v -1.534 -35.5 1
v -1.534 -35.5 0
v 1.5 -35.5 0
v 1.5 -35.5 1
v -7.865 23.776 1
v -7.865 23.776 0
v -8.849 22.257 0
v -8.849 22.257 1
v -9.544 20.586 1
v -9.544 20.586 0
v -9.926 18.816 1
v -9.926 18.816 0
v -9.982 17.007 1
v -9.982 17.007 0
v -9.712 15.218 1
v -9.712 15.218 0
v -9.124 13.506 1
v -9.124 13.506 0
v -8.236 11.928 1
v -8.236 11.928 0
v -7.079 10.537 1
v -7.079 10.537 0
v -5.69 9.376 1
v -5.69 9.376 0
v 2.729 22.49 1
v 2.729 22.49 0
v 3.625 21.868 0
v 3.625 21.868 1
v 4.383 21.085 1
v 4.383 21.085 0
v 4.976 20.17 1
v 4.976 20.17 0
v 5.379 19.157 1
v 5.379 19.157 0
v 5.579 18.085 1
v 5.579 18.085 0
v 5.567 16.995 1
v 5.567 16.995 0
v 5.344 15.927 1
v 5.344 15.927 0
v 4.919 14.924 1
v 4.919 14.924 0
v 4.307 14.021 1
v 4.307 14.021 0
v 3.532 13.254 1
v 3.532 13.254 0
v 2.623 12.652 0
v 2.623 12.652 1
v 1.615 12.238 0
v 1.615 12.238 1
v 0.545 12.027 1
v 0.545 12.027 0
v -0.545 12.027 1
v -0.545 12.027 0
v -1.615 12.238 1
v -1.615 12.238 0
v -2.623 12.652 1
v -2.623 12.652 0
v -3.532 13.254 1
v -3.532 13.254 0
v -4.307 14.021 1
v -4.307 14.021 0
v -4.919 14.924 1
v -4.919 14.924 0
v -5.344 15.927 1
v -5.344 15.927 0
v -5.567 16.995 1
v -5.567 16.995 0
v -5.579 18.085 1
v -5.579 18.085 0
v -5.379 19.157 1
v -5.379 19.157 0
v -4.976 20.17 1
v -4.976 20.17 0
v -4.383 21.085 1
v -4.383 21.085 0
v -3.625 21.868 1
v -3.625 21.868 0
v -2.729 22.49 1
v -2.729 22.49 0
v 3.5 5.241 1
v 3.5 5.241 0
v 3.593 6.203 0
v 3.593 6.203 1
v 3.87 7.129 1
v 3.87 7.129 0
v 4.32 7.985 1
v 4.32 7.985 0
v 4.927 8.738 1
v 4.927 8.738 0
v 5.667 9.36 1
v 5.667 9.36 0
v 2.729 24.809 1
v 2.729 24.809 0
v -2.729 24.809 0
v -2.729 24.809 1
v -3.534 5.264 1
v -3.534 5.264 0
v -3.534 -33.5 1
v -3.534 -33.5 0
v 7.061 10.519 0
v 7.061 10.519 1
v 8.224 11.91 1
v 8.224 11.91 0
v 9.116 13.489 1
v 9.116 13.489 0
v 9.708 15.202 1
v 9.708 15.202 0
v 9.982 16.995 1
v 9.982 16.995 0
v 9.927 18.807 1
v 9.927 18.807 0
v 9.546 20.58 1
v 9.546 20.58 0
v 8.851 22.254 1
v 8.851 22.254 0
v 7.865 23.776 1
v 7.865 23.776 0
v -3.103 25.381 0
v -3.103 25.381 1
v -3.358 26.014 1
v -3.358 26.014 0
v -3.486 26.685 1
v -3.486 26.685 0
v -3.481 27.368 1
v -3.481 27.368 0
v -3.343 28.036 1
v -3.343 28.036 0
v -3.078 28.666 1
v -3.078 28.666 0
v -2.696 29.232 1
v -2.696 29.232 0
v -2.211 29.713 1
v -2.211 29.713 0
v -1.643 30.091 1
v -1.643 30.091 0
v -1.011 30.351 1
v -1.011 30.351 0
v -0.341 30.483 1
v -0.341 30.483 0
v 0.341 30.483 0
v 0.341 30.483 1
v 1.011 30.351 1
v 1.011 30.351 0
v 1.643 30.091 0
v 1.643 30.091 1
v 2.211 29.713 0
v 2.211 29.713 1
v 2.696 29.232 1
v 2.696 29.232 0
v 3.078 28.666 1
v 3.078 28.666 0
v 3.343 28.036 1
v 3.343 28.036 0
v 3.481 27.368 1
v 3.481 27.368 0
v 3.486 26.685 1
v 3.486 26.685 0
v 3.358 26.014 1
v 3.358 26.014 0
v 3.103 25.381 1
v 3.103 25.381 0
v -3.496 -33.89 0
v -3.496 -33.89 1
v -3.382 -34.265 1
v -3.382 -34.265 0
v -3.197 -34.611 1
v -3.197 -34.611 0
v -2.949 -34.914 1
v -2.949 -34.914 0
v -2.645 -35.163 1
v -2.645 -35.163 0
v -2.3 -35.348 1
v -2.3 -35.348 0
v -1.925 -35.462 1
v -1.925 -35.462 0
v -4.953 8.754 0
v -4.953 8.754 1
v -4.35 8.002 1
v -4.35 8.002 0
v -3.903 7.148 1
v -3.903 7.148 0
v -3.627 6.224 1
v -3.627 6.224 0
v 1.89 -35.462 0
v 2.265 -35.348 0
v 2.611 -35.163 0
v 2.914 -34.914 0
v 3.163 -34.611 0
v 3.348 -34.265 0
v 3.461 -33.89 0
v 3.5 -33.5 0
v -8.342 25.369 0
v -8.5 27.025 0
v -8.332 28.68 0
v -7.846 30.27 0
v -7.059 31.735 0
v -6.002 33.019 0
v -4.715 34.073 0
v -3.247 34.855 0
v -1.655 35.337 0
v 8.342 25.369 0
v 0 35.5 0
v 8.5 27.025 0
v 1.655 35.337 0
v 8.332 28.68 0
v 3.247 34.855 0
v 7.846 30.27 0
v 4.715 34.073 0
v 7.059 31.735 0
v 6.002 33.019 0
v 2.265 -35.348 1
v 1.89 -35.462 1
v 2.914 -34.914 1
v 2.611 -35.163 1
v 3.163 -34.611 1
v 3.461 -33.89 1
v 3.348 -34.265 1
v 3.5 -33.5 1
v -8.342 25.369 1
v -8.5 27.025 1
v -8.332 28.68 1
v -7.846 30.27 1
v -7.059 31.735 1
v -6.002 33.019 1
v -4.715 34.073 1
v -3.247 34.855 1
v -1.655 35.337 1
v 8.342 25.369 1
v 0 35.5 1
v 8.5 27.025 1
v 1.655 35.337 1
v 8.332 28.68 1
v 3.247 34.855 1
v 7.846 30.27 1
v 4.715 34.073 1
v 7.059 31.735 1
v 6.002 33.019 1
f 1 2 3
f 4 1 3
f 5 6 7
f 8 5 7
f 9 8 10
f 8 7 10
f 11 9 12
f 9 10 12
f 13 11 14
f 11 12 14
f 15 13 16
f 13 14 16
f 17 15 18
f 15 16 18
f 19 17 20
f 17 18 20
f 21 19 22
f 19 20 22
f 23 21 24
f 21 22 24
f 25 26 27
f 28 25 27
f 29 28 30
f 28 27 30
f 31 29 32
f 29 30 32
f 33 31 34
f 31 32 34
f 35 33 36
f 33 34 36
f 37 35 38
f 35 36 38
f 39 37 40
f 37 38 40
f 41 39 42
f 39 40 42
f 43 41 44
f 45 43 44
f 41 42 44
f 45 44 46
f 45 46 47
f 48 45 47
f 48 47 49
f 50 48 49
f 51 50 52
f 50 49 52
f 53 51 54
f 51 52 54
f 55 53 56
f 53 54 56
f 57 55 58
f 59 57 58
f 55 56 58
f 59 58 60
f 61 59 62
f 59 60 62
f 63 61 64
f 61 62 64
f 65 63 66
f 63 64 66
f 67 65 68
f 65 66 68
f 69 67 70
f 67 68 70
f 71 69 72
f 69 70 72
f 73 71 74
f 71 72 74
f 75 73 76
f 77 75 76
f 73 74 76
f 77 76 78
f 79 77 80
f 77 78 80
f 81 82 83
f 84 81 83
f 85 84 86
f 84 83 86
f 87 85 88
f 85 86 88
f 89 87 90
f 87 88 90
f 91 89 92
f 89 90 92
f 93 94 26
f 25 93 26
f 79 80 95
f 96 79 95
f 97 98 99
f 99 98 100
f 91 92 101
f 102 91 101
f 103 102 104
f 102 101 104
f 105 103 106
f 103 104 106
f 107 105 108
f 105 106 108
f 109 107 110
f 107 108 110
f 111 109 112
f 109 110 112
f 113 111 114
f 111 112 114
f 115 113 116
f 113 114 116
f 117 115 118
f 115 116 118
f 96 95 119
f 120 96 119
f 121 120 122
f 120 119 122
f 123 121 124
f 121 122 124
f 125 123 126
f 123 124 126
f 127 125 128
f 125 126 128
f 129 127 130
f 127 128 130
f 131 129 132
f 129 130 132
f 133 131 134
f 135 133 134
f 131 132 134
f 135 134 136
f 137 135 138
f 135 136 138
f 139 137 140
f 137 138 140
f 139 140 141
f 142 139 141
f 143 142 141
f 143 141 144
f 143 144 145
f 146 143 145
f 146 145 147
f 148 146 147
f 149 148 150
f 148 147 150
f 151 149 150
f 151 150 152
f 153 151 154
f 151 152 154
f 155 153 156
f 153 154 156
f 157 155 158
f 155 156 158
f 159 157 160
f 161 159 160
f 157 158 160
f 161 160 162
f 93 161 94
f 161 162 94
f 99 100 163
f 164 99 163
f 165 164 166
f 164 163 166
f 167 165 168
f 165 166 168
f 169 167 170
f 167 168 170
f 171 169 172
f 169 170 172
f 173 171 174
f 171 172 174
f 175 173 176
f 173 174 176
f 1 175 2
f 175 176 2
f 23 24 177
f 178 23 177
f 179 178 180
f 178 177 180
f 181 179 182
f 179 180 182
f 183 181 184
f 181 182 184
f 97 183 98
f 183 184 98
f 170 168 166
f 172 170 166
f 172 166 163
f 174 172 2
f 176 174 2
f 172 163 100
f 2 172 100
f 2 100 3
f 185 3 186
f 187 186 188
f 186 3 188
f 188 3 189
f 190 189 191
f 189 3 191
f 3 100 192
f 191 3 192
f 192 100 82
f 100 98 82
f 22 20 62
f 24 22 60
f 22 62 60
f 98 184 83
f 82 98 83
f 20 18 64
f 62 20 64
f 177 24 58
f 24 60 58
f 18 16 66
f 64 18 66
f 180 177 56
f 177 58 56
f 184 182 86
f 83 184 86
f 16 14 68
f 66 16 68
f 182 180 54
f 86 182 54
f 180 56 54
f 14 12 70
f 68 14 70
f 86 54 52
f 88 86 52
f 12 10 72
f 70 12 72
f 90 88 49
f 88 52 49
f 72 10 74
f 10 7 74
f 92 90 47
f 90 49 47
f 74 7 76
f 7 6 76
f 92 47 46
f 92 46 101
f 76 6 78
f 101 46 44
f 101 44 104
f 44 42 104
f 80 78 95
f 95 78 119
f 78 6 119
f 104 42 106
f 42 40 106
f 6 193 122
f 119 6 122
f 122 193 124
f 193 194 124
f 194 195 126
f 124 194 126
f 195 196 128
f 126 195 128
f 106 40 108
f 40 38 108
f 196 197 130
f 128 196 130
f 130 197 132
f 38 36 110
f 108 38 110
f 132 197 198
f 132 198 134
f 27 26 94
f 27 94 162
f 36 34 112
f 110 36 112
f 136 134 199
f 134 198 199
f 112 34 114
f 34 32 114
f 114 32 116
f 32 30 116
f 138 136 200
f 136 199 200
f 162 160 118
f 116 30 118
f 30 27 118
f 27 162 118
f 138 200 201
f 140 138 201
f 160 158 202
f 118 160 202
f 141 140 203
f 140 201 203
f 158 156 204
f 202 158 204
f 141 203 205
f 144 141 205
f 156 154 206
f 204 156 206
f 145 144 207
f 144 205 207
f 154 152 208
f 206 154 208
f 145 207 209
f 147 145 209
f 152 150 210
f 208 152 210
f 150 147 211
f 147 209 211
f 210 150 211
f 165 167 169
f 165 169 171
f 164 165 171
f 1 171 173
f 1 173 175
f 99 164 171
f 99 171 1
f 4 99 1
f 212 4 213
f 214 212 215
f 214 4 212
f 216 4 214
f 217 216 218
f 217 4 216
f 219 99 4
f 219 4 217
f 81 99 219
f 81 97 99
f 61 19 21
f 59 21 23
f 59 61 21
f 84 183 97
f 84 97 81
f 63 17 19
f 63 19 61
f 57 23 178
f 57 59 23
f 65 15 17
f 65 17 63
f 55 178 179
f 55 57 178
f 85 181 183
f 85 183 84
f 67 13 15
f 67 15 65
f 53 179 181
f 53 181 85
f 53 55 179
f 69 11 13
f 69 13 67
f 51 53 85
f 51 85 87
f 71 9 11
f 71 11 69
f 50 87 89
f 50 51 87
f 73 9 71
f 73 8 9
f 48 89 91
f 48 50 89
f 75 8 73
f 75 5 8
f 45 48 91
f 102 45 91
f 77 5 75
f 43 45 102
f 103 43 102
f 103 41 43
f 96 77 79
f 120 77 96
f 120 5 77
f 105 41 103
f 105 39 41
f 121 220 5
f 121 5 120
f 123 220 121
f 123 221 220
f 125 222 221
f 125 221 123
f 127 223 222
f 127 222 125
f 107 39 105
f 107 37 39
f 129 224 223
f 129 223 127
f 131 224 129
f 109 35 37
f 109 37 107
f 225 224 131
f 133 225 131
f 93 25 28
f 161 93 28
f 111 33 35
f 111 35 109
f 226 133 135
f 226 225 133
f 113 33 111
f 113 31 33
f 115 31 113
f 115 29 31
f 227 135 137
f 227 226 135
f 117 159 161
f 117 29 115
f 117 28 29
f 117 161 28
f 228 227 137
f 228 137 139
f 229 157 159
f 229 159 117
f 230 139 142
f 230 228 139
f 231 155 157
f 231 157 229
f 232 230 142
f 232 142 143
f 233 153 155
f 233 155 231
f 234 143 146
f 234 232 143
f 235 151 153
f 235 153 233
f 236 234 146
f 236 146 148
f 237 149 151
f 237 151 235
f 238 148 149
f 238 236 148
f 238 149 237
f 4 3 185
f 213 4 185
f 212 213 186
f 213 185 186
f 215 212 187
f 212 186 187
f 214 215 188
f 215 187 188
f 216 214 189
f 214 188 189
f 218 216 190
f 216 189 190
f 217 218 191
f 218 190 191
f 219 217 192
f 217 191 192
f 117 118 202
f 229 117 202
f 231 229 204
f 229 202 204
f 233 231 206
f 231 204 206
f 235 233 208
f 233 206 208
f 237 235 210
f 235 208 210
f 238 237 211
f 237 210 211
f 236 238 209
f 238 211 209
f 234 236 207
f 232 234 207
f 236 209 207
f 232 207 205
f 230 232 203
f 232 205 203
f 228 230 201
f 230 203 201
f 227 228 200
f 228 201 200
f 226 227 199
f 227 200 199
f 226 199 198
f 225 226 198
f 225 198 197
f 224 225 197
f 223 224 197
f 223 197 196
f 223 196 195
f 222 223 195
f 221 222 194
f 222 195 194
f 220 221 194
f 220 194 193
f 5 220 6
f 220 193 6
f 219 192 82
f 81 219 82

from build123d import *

# Parameters (mm, degrees)
F2_DEPTH = 1


# Not quite as in the source:
# - ends of sketch curves that miss each other by under 0.0002 mm in the source are joined


with BuildPart() as f2:
    # F1 (on Top) → F2 (new body)
    with BuildSketch(Plane.XY):
        with BuildLine():
            Line((-1.534358, -35.5), (1.499849, -35.5))
            ThreePointArc((1.499849, -35.5), (2.9140625624, -34.9142135624), (3.499849, -33.5))
            Line((3.499849, -33.5), (3.499849, 5.24069))
            ThreePointArc((3.499849, 5.24069), (4.0745571603, 7.568090295), (5.6665658533, 9.3604602133))
            ThreePointArc((5.6665658533, 9.3604602133), (9.8857158615, 16.0924782241), (7.8648732423, 23.7760641903))
            ThreePointArc((7.8648732423, 23.7760641903), (1.896e-07, 35.5), (-7.8648736534, 23.7760641421))
            ThreePointArc((-7.8648736534, 23.7760641421), (-9.8878127884, 16.1062937833), (-5.6895721633, 9.376328764))
            ThreePointArc((-5.6895721633, 9.376328764), (-4.1058182159, 7.585707204), (-3.534358, 5.264493))
            Line((-3.534358, 5.264493), (-3.534358, -33.5))
            ThreePointArc((-3.534358, -33.5), (-2.9485715624, -34.9142135624), (-1.534358, -35.5))
        make_face()
        with BuildLine():
            Line((-2.729304, 22.489878), (-2.729304, 24.808904))
            ThreePointArc((-2.729304, 24.808904), (3.13e-07, 30.5), (2.7293033847, 24.8089036912))
            Line((2.7293033847, 24.8089036912), (2.729303, 22.489878))
            ThreePointArc((2.729303, 22.489878), (4.366e-07, 12), (-2.729304, 22.489878))
        make_face(mode=Mode.SUBTRACT)
    extrude(amount=F2_DEPTH)


solid = f2.part
